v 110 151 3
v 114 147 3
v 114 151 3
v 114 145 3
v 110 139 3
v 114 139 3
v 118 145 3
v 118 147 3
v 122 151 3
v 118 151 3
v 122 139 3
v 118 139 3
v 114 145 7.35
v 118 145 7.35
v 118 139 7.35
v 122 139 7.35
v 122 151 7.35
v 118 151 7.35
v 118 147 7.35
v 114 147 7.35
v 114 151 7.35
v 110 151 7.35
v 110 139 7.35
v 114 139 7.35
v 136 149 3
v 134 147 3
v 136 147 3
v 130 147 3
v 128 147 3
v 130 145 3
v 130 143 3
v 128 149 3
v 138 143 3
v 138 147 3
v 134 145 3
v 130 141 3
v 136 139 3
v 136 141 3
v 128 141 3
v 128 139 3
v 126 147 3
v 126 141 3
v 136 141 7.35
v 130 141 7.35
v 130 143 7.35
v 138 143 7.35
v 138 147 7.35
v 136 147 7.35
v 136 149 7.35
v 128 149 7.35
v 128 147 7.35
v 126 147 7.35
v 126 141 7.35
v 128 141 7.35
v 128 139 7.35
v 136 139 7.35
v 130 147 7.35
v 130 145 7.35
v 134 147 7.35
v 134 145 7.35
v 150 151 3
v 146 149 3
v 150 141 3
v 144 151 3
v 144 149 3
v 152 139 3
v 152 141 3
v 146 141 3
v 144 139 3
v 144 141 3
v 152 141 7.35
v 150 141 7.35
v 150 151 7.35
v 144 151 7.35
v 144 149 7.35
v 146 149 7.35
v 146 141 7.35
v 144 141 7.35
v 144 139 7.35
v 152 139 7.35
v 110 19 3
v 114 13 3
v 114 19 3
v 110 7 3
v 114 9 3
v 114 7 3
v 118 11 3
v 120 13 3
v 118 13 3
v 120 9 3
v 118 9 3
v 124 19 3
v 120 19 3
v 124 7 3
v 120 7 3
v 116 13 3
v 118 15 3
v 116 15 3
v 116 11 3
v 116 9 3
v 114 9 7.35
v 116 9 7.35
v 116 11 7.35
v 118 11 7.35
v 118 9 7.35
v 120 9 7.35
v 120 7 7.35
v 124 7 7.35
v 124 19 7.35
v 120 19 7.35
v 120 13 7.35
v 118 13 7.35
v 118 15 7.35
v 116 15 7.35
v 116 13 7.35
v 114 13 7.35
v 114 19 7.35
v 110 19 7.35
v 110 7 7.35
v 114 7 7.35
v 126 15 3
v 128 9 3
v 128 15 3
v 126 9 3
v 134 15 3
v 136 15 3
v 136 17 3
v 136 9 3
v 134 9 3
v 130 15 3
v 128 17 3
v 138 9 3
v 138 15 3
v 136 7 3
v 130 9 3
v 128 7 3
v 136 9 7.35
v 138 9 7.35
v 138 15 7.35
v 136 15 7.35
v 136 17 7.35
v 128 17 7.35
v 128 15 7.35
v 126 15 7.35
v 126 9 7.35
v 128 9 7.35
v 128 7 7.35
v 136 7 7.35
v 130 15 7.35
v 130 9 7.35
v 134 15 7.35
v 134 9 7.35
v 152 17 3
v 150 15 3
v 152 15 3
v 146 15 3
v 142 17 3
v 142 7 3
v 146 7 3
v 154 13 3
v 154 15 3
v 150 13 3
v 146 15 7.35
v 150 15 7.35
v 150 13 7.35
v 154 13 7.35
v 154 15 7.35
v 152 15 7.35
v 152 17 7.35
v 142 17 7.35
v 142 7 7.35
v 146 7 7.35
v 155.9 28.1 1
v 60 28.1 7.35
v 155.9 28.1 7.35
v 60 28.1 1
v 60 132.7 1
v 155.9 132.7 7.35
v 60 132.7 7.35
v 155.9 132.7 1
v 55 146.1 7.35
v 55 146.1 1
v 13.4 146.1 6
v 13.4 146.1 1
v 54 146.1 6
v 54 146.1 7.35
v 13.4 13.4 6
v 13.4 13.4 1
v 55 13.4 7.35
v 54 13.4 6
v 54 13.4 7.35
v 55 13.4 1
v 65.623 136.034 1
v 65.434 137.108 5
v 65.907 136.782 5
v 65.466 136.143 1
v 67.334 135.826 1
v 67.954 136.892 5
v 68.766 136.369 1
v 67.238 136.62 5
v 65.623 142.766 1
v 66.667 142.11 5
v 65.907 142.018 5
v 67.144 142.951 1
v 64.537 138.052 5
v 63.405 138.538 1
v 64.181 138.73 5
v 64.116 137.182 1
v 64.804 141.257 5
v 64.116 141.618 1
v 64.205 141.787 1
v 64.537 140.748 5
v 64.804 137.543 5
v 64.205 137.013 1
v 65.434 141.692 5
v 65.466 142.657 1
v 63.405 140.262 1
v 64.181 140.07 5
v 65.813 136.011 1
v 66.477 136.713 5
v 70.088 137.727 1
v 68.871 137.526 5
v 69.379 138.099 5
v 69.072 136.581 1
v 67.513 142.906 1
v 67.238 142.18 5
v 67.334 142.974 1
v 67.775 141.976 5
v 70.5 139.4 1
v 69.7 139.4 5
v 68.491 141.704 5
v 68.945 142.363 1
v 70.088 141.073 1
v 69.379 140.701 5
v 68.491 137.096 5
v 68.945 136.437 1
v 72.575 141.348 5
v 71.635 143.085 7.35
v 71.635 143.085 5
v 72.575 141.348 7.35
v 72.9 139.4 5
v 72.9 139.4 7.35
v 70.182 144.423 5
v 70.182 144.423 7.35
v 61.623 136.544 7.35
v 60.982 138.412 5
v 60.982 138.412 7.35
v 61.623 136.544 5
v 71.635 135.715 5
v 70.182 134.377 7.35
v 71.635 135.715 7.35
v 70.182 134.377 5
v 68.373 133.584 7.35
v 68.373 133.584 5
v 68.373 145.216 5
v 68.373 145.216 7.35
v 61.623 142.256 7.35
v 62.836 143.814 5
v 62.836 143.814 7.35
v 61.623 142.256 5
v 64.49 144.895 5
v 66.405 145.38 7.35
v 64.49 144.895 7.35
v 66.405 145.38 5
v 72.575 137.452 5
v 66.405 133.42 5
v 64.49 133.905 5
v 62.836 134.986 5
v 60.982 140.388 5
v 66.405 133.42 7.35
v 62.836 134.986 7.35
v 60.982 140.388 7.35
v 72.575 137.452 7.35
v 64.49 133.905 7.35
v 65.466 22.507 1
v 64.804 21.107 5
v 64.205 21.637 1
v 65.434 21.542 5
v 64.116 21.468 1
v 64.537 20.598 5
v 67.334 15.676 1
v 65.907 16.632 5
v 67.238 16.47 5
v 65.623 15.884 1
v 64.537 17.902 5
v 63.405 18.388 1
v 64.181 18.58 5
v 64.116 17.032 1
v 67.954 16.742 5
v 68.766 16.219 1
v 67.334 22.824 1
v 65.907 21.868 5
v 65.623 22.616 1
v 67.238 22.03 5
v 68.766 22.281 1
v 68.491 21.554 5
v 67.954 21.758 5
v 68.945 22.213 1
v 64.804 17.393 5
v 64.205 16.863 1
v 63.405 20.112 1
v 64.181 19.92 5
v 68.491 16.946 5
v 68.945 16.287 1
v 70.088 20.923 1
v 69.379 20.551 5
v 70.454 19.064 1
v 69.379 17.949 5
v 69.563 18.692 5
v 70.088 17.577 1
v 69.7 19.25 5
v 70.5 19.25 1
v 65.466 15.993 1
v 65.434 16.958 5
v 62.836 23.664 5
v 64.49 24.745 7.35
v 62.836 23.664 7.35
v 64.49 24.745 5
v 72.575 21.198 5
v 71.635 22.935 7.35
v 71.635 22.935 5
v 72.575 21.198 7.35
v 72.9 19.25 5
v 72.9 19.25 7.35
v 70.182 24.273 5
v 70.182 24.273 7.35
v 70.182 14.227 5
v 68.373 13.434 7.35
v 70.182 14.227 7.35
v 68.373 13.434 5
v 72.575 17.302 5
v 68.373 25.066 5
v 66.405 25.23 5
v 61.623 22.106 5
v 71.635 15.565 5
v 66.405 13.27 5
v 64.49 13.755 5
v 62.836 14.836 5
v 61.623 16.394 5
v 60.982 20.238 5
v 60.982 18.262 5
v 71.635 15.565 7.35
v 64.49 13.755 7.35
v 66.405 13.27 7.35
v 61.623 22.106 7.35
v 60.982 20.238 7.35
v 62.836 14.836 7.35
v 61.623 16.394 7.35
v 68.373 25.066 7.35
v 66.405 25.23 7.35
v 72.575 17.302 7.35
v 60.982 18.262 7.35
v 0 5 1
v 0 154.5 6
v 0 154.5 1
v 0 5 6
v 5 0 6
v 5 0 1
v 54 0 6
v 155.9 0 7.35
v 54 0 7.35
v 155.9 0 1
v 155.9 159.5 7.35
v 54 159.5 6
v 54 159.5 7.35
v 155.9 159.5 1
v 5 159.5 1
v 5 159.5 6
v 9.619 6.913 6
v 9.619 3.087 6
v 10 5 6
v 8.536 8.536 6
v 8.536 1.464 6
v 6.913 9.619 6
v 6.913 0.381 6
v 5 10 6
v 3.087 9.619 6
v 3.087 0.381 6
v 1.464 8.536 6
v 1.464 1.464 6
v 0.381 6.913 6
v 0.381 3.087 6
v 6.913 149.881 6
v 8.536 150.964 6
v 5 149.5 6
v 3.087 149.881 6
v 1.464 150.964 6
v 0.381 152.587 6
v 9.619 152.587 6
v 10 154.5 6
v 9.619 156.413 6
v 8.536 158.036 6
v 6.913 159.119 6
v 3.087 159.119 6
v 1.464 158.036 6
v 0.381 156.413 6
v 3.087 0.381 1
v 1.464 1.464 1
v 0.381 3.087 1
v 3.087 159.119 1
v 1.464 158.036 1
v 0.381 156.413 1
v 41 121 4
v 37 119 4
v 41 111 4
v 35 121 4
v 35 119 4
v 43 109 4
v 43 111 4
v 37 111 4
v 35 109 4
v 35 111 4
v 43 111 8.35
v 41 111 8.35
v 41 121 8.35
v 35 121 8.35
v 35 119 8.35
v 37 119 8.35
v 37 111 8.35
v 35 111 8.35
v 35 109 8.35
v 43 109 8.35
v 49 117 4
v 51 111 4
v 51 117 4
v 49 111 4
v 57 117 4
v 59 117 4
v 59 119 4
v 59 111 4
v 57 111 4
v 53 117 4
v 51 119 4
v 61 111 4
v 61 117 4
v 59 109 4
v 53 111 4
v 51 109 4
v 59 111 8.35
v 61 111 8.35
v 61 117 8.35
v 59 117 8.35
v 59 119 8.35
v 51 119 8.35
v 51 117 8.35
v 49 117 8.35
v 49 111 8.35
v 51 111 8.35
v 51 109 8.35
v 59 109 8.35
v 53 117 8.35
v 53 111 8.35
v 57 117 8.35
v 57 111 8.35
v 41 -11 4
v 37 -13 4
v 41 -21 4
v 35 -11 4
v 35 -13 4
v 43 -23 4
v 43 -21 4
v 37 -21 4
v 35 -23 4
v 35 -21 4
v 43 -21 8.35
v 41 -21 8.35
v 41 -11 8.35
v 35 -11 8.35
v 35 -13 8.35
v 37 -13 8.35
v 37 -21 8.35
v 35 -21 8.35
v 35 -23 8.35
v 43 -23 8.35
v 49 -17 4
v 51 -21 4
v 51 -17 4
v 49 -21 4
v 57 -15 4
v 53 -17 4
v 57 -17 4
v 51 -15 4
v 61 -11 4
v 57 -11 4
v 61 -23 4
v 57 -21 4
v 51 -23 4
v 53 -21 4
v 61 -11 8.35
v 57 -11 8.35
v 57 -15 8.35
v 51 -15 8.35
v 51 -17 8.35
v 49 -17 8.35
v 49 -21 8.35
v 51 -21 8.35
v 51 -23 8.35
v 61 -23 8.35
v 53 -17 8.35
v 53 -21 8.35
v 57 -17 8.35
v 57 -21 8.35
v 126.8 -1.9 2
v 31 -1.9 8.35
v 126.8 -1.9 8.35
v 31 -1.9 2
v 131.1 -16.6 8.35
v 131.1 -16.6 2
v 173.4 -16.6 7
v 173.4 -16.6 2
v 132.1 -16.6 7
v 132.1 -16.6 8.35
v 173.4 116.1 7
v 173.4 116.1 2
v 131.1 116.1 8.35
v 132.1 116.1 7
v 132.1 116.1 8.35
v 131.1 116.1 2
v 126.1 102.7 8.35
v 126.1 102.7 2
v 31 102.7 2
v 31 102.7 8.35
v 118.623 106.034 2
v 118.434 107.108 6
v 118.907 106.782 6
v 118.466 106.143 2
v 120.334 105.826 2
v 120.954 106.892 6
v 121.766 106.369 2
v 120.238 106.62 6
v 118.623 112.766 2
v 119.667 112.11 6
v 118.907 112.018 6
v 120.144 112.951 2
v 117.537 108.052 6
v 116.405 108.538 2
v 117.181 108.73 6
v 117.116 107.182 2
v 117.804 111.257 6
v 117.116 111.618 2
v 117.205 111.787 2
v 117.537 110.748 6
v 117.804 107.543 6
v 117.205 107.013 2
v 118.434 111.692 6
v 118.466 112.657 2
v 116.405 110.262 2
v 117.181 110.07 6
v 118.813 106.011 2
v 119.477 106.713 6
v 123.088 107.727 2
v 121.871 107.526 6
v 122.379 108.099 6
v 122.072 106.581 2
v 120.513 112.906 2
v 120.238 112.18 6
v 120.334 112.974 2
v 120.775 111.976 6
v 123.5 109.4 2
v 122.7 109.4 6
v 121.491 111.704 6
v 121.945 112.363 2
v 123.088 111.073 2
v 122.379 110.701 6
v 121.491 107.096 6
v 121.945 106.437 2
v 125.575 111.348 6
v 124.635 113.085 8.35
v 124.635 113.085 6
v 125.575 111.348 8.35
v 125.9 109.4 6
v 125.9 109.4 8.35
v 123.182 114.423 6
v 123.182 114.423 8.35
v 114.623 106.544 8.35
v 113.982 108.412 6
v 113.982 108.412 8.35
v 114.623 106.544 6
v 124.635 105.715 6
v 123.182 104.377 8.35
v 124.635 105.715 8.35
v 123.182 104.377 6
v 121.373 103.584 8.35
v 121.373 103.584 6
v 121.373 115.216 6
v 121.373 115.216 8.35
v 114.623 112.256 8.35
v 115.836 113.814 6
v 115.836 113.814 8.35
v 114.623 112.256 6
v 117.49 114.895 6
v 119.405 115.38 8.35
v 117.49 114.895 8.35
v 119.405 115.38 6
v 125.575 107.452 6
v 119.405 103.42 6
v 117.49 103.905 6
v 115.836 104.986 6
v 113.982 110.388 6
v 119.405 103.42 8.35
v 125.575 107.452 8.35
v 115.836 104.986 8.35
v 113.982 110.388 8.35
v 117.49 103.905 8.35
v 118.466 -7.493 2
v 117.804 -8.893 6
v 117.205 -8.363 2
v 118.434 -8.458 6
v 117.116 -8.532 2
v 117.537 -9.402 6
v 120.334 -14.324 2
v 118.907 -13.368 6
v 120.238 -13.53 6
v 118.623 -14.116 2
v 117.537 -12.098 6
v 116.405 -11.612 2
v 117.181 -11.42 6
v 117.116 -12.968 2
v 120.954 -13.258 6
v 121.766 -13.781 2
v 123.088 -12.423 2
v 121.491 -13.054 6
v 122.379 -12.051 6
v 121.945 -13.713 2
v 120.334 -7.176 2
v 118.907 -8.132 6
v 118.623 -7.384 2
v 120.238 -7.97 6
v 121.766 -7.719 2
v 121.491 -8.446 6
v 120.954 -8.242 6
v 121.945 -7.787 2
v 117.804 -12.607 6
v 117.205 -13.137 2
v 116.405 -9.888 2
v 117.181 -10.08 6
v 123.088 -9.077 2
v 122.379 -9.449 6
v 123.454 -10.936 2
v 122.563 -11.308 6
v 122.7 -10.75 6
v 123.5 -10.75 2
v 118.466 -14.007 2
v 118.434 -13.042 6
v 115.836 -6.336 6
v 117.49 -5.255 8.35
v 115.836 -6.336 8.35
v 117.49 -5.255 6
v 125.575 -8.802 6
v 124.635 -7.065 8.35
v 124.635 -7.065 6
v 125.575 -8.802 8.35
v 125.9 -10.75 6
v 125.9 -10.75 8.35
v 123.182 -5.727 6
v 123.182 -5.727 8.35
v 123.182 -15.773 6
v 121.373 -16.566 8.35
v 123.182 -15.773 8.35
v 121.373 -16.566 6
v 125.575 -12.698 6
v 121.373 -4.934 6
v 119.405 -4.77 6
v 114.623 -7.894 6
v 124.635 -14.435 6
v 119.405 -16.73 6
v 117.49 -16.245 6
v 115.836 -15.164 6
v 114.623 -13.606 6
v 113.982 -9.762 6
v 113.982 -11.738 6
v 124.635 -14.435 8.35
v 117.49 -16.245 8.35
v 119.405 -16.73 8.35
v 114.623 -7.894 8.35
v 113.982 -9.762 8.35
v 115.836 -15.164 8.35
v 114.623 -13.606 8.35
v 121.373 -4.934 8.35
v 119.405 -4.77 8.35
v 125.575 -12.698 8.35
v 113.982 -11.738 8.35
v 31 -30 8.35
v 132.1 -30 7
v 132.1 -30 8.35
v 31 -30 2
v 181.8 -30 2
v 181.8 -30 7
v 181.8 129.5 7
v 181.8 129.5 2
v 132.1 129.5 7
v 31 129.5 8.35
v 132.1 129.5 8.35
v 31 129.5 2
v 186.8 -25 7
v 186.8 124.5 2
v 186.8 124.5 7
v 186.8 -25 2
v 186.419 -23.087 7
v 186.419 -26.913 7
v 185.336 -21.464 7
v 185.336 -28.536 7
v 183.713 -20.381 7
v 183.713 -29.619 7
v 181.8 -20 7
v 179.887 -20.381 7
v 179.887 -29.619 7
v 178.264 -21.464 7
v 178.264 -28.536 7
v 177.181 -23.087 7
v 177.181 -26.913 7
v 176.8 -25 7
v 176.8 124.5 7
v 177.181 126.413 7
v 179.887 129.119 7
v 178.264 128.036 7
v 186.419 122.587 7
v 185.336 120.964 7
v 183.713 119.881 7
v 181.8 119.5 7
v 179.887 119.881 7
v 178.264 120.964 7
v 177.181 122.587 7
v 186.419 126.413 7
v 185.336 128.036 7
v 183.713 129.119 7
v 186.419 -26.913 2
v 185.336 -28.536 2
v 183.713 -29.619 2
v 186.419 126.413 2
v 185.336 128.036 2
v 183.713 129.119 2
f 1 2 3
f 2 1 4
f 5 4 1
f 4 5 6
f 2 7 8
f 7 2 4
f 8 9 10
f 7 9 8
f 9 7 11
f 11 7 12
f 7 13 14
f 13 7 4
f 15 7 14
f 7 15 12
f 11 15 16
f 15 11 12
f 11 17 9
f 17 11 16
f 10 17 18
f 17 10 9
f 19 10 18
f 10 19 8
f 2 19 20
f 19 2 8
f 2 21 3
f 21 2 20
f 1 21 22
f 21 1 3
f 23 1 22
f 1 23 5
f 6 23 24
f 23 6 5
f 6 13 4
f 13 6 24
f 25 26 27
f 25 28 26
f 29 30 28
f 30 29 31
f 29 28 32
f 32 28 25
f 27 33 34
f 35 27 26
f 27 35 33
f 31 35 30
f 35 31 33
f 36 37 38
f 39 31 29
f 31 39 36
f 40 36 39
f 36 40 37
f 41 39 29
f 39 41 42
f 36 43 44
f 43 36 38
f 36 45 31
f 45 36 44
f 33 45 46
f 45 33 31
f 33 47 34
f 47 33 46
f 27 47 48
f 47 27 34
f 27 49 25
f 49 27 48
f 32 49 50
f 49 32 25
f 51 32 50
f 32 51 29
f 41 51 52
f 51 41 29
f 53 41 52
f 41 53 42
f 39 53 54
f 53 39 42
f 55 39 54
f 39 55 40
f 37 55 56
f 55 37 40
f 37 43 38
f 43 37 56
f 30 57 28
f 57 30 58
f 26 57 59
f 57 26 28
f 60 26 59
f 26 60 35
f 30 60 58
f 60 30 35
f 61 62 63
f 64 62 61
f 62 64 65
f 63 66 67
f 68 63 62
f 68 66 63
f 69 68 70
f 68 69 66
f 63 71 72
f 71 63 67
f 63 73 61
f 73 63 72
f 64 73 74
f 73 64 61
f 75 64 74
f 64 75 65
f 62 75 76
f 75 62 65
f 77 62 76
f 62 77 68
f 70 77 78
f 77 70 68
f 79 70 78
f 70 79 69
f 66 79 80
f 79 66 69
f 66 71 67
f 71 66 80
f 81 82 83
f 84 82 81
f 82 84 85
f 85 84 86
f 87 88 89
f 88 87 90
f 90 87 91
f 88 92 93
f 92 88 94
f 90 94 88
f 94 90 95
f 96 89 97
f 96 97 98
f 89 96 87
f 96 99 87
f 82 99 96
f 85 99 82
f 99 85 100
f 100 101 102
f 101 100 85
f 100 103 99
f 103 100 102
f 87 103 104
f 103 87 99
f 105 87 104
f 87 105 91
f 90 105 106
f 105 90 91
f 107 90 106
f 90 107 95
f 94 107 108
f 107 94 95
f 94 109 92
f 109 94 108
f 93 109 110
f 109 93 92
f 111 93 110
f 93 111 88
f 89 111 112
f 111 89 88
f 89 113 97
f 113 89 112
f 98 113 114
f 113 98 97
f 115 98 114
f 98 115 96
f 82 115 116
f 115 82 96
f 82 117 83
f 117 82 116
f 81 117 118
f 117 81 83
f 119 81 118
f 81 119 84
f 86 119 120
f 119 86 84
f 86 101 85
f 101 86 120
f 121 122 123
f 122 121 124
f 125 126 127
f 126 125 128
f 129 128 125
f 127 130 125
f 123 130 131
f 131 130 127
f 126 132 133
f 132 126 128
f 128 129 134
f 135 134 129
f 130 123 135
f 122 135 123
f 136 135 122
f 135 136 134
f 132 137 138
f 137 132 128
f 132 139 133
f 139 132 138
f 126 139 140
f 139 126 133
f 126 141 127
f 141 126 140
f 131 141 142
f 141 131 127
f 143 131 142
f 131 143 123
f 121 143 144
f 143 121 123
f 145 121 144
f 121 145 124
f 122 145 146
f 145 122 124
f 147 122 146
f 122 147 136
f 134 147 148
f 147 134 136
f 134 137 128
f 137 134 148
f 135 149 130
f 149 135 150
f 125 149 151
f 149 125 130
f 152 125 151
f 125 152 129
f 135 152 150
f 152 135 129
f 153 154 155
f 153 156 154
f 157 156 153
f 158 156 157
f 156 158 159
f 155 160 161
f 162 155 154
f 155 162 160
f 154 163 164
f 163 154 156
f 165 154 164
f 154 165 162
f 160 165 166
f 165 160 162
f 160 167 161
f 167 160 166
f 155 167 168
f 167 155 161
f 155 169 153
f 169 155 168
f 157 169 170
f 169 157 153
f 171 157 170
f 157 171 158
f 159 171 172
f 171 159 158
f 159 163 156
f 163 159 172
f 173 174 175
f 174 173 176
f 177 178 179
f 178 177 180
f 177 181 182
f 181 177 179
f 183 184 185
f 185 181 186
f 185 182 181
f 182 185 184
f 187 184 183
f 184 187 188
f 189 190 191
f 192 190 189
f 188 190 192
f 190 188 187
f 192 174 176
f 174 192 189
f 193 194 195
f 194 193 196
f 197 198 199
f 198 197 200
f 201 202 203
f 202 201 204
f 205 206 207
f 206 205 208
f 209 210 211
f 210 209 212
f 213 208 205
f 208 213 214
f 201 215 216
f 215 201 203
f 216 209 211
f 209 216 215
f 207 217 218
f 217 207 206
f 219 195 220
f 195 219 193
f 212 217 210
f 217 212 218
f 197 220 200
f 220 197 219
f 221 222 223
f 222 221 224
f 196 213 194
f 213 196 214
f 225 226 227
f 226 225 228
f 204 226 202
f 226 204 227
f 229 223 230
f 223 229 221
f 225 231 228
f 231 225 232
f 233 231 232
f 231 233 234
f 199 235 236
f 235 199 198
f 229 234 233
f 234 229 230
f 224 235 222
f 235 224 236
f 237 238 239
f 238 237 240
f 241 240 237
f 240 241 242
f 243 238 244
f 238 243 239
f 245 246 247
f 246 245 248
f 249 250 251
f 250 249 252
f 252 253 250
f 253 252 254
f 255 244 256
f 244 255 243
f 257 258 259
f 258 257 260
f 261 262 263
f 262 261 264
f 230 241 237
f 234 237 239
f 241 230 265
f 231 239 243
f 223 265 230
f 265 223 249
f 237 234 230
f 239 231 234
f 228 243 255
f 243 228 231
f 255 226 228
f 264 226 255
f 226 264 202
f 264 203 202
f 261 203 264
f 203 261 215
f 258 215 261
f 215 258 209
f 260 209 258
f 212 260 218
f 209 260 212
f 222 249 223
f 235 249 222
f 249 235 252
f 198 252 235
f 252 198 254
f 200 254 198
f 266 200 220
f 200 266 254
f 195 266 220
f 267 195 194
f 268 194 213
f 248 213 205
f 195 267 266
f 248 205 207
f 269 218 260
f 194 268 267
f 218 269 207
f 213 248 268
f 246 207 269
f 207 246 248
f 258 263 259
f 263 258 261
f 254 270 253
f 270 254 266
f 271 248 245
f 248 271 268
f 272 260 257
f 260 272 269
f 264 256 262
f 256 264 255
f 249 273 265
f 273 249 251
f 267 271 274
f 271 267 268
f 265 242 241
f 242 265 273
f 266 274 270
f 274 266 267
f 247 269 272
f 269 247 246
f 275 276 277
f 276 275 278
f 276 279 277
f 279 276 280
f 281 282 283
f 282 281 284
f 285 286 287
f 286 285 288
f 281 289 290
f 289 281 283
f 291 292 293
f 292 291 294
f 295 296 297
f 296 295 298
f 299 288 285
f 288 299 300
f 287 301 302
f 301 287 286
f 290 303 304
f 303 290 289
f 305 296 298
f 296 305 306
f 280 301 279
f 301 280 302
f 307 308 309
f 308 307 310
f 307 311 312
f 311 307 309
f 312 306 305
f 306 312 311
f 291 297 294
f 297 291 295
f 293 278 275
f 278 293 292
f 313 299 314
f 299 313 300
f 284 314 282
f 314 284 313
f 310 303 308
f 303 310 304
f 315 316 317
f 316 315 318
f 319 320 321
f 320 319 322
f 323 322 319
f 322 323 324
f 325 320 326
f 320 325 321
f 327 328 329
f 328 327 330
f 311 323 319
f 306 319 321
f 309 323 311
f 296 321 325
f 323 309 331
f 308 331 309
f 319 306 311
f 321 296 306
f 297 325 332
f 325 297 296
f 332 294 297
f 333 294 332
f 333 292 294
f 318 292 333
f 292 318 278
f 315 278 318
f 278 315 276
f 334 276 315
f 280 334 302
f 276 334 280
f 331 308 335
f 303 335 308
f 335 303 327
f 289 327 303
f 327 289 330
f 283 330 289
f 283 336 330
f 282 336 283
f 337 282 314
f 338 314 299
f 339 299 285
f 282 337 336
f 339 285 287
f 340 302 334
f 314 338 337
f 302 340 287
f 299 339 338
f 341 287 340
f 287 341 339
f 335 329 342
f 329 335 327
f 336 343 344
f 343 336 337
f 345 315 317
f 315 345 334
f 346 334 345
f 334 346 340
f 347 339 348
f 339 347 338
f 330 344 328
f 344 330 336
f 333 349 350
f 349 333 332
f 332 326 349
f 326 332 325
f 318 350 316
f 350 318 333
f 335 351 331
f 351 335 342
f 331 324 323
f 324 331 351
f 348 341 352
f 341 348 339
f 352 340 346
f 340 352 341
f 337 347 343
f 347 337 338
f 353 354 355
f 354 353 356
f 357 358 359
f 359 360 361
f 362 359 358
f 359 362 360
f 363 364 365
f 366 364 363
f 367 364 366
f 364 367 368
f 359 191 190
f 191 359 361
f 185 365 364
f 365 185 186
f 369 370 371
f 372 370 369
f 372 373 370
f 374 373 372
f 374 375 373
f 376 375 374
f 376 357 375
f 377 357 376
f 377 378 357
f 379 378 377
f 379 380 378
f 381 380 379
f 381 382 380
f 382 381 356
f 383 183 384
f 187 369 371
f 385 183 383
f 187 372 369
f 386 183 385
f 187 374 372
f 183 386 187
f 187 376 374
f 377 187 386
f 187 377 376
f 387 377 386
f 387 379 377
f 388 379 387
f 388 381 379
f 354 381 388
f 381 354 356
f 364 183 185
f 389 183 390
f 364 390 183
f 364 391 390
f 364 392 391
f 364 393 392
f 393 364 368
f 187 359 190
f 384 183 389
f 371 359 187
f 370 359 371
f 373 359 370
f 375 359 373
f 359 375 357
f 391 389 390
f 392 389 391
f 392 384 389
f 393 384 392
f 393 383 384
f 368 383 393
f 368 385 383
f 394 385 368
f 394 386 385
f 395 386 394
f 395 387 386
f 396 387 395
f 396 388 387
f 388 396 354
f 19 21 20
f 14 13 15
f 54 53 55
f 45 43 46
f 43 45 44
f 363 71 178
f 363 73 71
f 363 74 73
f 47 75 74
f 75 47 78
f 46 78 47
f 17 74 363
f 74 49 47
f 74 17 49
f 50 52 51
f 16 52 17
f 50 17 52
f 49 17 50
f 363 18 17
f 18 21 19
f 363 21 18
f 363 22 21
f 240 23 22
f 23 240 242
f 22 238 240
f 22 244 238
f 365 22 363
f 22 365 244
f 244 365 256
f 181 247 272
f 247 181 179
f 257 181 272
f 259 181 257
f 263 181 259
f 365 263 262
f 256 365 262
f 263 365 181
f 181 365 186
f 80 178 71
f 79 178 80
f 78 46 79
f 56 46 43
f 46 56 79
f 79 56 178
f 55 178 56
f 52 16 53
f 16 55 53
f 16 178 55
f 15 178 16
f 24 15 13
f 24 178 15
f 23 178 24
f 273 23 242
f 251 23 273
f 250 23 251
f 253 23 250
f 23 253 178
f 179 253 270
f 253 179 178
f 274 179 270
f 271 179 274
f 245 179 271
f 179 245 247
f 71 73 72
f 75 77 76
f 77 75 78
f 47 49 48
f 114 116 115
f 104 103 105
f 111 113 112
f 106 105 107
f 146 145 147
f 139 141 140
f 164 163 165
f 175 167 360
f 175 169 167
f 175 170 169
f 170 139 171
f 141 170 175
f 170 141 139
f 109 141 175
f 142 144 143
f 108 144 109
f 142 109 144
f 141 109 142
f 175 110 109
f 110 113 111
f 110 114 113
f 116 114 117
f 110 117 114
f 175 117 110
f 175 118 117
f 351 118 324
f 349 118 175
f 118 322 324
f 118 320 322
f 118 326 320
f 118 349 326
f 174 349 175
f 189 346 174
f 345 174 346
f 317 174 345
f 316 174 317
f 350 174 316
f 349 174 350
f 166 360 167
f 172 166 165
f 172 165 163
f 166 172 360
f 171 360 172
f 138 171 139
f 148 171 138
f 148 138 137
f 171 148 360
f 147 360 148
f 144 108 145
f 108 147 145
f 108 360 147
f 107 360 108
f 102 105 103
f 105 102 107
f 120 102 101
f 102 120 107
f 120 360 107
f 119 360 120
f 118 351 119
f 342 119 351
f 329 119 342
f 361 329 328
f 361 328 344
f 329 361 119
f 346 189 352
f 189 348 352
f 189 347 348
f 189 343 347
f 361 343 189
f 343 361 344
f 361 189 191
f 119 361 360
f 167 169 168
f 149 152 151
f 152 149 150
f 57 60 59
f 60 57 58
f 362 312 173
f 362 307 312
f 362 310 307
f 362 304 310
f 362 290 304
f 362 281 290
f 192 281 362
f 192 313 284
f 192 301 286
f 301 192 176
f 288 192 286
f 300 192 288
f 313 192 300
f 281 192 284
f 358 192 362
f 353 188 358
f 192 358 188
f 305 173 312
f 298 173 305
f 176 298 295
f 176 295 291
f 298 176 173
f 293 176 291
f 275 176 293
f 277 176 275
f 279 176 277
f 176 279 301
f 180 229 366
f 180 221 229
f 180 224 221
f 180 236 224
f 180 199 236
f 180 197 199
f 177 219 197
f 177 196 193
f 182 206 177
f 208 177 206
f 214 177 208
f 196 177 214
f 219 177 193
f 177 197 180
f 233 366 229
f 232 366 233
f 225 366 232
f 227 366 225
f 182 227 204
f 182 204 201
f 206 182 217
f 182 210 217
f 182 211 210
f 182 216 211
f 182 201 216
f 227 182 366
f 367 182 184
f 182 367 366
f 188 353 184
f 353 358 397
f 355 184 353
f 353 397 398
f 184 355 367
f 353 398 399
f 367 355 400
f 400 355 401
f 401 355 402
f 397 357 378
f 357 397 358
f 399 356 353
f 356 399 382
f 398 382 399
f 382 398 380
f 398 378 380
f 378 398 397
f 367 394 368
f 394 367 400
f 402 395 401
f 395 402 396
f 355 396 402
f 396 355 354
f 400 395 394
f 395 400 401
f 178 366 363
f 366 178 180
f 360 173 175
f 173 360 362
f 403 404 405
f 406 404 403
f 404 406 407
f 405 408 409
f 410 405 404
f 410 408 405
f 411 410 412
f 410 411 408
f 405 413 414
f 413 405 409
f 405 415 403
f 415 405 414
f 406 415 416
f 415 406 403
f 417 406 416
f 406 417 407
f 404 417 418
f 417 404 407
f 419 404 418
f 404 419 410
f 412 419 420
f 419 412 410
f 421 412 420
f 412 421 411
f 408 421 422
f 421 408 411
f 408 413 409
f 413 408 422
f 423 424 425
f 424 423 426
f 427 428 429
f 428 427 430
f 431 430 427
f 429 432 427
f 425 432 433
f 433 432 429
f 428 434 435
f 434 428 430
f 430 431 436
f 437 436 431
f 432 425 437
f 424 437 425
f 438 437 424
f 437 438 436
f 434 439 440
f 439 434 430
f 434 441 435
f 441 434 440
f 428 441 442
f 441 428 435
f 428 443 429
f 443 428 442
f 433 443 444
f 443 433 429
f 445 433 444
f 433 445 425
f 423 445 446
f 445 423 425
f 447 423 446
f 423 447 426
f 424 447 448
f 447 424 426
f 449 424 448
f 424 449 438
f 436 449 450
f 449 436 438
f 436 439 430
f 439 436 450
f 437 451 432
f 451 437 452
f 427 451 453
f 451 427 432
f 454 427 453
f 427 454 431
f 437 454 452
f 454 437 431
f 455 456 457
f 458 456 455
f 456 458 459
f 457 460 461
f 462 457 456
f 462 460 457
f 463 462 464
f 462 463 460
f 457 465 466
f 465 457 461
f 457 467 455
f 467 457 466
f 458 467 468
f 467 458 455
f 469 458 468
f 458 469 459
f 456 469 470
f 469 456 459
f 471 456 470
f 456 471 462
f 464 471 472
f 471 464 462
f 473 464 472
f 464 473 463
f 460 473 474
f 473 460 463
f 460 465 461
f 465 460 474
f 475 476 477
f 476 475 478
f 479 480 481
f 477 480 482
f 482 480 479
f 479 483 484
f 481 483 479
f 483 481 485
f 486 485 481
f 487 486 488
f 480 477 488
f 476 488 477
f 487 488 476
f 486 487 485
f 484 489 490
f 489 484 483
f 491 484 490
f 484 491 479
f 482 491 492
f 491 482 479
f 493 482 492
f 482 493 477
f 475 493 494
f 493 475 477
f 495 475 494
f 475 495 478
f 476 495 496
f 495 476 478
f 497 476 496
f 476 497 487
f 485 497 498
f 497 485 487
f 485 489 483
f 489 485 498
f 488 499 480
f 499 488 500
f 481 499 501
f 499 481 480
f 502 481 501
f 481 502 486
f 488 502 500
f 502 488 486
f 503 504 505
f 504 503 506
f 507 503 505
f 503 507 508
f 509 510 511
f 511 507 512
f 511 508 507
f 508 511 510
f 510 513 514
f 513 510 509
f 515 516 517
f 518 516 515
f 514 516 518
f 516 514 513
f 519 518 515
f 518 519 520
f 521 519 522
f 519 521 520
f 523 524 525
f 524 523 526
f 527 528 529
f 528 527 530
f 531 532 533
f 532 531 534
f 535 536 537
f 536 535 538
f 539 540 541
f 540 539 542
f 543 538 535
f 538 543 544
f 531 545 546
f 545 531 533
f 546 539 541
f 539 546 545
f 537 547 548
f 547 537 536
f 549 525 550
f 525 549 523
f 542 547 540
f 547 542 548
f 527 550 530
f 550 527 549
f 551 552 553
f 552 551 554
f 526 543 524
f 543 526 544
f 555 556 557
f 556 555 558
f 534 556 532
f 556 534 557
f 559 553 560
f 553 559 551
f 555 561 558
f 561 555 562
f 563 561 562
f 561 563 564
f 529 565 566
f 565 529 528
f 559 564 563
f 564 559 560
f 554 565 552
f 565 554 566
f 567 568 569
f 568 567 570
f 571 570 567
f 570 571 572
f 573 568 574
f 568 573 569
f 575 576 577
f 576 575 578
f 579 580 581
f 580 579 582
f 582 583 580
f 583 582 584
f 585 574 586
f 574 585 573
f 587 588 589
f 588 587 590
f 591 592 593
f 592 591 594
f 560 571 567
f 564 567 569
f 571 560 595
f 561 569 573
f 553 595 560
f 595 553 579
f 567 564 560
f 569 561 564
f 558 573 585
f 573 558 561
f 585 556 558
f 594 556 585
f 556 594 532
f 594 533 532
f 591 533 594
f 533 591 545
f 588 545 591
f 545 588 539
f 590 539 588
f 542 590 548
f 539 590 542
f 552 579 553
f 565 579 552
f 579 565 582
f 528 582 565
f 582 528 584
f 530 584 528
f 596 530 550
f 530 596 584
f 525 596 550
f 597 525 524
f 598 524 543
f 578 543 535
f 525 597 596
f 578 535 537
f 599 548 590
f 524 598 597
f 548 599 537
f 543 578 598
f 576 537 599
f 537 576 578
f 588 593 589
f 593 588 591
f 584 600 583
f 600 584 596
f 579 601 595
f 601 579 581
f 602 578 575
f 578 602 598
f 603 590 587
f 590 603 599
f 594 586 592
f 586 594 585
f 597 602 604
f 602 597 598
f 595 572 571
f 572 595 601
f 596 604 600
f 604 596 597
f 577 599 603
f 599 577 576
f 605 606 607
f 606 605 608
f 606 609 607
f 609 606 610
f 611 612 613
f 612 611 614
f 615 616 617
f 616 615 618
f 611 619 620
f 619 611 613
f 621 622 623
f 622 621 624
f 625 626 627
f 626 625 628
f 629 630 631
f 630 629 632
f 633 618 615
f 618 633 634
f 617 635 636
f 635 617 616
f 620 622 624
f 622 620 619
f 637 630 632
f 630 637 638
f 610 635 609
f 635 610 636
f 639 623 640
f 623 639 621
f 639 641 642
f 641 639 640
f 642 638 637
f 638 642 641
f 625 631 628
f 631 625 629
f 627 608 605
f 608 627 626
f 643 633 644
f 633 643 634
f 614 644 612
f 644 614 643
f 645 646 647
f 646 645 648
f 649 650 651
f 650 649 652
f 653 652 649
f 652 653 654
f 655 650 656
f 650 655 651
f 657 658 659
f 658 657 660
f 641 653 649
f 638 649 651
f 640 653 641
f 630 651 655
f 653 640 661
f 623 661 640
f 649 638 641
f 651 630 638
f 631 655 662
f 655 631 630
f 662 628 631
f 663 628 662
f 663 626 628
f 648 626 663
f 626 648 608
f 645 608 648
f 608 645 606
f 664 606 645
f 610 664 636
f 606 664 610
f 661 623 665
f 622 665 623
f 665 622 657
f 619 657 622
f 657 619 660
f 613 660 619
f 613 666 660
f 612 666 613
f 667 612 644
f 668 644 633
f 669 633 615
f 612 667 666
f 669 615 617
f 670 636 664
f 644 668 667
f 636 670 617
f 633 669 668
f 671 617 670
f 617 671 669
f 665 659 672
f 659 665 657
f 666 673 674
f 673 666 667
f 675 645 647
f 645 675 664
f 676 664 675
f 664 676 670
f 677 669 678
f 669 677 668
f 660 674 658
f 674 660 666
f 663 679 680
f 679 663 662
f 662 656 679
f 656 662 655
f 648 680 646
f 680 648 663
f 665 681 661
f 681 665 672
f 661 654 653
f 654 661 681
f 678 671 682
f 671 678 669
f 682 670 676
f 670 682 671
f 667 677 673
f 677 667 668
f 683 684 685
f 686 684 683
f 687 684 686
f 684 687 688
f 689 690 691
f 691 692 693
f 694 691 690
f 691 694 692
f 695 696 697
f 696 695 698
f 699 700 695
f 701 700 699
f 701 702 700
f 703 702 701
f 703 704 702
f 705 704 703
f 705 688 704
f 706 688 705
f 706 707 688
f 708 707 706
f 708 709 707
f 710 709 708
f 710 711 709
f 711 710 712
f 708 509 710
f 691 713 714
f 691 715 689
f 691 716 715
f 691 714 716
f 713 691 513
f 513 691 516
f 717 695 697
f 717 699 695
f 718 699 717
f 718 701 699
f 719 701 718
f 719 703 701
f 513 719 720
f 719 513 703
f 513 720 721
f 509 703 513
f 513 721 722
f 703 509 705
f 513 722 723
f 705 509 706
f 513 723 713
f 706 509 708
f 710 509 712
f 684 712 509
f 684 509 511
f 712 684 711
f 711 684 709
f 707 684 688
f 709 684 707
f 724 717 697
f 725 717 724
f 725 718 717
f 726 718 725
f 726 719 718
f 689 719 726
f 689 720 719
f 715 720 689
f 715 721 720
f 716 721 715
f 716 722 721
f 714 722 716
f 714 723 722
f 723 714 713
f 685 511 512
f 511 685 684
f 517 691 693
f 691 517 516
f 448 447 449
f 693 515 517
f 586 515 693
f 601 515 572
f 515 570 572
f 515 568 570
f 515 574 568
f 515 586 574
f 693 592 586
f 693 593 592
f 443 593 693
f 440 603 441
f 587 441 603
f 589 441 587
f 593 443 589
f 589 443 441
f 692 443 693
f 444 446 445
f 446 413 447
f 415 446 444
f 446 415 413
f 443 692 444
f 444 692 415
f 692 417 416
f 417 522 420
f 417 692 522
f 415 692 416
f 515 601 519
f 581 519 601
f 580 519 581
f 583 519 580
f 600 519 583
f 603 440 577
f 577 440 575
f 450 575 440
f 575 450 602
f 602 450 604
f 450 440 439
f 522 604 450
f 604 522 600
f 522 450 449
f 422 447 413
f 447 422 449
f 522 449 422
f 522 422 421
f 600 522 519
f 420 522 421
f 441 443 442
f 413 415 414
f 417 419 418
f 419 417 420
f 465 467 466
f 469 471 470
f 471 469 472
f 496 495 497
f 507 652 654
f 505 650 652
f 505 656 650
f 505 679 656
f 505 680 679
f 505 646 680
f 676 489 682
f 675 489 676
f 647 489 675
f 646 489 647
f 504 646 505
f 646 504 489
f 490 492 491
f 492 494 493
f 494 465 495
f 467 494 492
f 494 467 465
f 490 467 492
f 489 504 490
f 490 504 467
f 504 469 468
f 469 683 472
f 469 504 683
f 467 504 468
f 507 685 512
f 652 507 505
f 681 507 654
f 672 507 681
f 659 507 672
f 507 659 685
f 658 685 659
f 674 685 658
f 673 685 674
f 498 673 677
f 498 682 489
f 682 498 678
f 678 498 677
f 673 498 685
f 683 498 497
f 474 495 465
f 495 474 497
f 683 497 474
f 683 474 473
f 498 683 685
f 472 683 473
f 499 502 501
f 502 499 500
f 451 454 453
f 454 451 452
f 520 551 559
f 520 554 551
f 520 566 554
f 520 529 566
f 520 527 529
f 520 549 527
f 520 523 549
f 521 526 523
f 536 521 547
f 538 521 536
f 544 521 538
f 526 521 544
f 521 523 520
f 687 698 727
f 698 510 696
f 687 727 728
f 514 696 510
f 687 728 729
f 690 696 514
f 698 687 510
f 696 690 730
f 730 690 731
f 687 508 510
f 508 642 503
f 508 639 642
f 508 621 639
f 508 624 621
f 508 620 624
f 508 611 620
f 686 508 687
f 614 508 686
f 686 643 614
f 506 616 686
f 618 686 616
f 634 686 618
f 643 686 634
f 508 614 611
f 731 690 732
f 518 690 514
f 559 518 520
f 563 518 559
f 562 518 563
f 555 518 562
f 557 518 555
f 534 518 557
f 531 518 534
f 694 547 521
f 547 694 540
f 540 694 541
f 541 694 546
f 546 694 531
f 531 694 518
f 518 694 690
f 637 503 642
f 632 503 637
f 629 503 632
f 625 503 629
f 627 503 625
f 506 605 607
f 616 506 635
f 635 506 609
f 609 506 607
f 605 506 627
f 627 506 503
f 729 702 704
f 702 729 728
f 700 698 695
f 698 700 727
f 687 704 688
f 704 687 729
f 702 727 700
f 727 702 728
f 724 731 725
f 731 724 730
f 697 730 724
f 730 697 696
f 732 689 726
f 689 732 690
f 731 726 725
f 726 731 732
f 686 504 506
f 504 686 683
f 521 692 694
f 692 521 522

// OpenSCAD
include <MCAD/shapes.scad>
use <MCAD/fonts.scad>

//Choose what font you want
thisFont=8bit_polyfont();

x_shift=thisFont[0][0];
y_shift=thisFont[0][1];

// preview[view:south, tilt:top]

//Choose between full size 12in X 6in (311.8) or split (155.9) to fit build platform.
plate=155.9;//[155.9,311.8]

//Change font to fit text in space
font_scale=2;//[1,1.5,2,2.5,3]

//1 goes all the way through, 8 leaves blank
text_depth=3;//[1,2,3,4,5,6,7,8]


//This is the text for the top // Use spaces in front of word to center
top_word="   Hello";

//This is the text for the bottom // Use spaces in front of word to center
bottom_word="   World";


module license_plate_trim();
{
	difference()
	{
		union()
		{
			difference()
			{
				translate([0,0,1])scale([311.8,159.5,6.35])cube(1);
					union()
					{
						linear_extrude(height=10)translate([0,0,-5])polygon(points=[[13.4,13.4],[55,13.4],[60,28.1],[251.8,28.1],[256.1,13.4],[298.4,13.4],[298.4,146.1],[256.1,146.1],[256.1,146.1],[251.1,132.7],[60,132.7],[55,146.1],[13.4,146.1]],paths=[[0,1,2,3,4,5,6,7,8,9,10,11,12]]);
						translate([66.9,139.4,-1])cylinder(10,4,2);
						translate([66.9,139.4,5])cylinder(5,6,6);
						translate([244.9,139.4,-1])cylinder(10,4,2);
						translate([244.9,139.4,5])cylinder(5,6,6);
						translate([66.9,19.25,-1])cylinder(10,4,2);
						translate([66.9,19.25,5])cylinder(5,6,6);
						translate([244.9,19.25,-1])cylinder(10,4,2);
						translate([244.9,19.25,5])cylinder(5,6,6);
						cube([5,5,10]);
						translate([0,154.5,0])cube([5,5,10]);
						translate([306.8,154.5,0])cube([5,5,10]);
						translate([306.8,0,0])cube([5,5,10]);
						translate([-1,-1,6])cube([55,165,3]);
						translate([257.1,-1,6])cube([55,165,3]);
						translate([60,145,text_depth-2])License_Top_Label();
						translate([60,13,text_depth-2])License_Bottom_Label();
					}
			}
		translate([5,5,1])cylinder(5,5,5);
		translate([5,154.5,1])cylinder(5,5,5);
		translate([306.8,5,1])cylinder(5,5,5);
		translate([306.8,154.5,1])cylinder(5,5,5);
	
		}
translate([plate,-10,0])scale([400,200,20])cube(1);
}
}


module License_Bottom_Label()
	{
	theseIndicies=search(bottom_word,thisFont[2],1,1);
	difference() 
		{
		union() 
			{
				scale([font_scale,font_scale,2])
					{
						for(i=[0:(len(theseIndicies)-1)] ) 
							translate([i*x_shift, -y_shift/2 ,1]) 
						{
							linear_extrude(height=4) polygon(points=thisFont[2][theseIndicies[i]][6][0],paths=thisFont[2][theseIndicies[i]][6][1]);
						}
					}
			}
		}
	}

module License_Top_Label()
	{

	theseIndicies=search(top_word,thisFont[2],1,1);
	difference() 
		{
		union() 
			{
				scale([font_scale,font_scale,2])
					{
						for(i=[0:(len(theseIndicies)-1)] ) 
							translate([ i*x_shift, -y_shift/2 ,1]) 
						{
							linear_extrude(height=4) polygon(points=thisFont[2][theseIndicies[i]][6][0],paths=thisFont[2][theseIndicies[i]][6][1]);

						}
					}
			}
		}
	}
module right_half_license_plate_trim();
{
	difference()
	{
		union()
		{
			translate([-125,-30,1])difference()
			{
				translate([0,0,1])scale([311.8,159.5,6.35])cube(1);
					union()
					{
						linear_extrude(height=10)translate([0,0,-5])polygon(points=[[13.4,13.4],[55,13.4],[60,28.1],[251.8,28.1],[256.1,13.4],[298.4,13.4],[298.4,146.1],[256.1,146.1],[256.1,146.1],[251.1,132.7],[60,132.7],[55,146.1],[13.4,146.1]],paths=[[0,1,2,3,4,5,6,7,8,9,10,11,12]]);
						translate([66.9,139.4,-1])cylinder(10,4,2);
						translate([66.9,139.4,5])cylinder(5,6,6);
						translate([244.9,139.4,-1])cylinder(10,4,2);
						translate([244.9,139.4,5])cylinder(5,6,6);
						translate([66.9,19.25,-1])cylinder(10,4,2);
						translate([66.9,19.25,5])cylinder(5,6,6);
						translate([244.9,19.25,-1])cylinder(10,4,2);
						translate([244.9,19.25,5])cylinder(5,6,6);
						cube([5,5,10]);
						translate([0,154.5,0])cube([5,5,10]);
						translate([306.8,154.5,0])cube([5,5,10]);
						translate([306.8,0,0])cube([5,5,10]);
						translate([-1,-1,6])cube([55,165,3]);
						translate([257.1,-1,6])cube([55,165,3]);
						translate([60,145,text_depth-2])License_Top_Label();
						translate([60,13,text_depth-2])License_Bottom_Label();
					}
			}
			translate([-125,-30,1])union()
			{
				translate([306.8,5,1])cylinder(5,5,5);
				translate([306.8,154.5,1])cylinder(5,5,5);
				translate([5,5,1])cylinder(5,5,5);
				translate([5,154.5,1])cylinder(5,5,5);
			}
		}
		
	translate([plate-436.9,-40,0])scale([312,200,20])cube(1);
	}
}
